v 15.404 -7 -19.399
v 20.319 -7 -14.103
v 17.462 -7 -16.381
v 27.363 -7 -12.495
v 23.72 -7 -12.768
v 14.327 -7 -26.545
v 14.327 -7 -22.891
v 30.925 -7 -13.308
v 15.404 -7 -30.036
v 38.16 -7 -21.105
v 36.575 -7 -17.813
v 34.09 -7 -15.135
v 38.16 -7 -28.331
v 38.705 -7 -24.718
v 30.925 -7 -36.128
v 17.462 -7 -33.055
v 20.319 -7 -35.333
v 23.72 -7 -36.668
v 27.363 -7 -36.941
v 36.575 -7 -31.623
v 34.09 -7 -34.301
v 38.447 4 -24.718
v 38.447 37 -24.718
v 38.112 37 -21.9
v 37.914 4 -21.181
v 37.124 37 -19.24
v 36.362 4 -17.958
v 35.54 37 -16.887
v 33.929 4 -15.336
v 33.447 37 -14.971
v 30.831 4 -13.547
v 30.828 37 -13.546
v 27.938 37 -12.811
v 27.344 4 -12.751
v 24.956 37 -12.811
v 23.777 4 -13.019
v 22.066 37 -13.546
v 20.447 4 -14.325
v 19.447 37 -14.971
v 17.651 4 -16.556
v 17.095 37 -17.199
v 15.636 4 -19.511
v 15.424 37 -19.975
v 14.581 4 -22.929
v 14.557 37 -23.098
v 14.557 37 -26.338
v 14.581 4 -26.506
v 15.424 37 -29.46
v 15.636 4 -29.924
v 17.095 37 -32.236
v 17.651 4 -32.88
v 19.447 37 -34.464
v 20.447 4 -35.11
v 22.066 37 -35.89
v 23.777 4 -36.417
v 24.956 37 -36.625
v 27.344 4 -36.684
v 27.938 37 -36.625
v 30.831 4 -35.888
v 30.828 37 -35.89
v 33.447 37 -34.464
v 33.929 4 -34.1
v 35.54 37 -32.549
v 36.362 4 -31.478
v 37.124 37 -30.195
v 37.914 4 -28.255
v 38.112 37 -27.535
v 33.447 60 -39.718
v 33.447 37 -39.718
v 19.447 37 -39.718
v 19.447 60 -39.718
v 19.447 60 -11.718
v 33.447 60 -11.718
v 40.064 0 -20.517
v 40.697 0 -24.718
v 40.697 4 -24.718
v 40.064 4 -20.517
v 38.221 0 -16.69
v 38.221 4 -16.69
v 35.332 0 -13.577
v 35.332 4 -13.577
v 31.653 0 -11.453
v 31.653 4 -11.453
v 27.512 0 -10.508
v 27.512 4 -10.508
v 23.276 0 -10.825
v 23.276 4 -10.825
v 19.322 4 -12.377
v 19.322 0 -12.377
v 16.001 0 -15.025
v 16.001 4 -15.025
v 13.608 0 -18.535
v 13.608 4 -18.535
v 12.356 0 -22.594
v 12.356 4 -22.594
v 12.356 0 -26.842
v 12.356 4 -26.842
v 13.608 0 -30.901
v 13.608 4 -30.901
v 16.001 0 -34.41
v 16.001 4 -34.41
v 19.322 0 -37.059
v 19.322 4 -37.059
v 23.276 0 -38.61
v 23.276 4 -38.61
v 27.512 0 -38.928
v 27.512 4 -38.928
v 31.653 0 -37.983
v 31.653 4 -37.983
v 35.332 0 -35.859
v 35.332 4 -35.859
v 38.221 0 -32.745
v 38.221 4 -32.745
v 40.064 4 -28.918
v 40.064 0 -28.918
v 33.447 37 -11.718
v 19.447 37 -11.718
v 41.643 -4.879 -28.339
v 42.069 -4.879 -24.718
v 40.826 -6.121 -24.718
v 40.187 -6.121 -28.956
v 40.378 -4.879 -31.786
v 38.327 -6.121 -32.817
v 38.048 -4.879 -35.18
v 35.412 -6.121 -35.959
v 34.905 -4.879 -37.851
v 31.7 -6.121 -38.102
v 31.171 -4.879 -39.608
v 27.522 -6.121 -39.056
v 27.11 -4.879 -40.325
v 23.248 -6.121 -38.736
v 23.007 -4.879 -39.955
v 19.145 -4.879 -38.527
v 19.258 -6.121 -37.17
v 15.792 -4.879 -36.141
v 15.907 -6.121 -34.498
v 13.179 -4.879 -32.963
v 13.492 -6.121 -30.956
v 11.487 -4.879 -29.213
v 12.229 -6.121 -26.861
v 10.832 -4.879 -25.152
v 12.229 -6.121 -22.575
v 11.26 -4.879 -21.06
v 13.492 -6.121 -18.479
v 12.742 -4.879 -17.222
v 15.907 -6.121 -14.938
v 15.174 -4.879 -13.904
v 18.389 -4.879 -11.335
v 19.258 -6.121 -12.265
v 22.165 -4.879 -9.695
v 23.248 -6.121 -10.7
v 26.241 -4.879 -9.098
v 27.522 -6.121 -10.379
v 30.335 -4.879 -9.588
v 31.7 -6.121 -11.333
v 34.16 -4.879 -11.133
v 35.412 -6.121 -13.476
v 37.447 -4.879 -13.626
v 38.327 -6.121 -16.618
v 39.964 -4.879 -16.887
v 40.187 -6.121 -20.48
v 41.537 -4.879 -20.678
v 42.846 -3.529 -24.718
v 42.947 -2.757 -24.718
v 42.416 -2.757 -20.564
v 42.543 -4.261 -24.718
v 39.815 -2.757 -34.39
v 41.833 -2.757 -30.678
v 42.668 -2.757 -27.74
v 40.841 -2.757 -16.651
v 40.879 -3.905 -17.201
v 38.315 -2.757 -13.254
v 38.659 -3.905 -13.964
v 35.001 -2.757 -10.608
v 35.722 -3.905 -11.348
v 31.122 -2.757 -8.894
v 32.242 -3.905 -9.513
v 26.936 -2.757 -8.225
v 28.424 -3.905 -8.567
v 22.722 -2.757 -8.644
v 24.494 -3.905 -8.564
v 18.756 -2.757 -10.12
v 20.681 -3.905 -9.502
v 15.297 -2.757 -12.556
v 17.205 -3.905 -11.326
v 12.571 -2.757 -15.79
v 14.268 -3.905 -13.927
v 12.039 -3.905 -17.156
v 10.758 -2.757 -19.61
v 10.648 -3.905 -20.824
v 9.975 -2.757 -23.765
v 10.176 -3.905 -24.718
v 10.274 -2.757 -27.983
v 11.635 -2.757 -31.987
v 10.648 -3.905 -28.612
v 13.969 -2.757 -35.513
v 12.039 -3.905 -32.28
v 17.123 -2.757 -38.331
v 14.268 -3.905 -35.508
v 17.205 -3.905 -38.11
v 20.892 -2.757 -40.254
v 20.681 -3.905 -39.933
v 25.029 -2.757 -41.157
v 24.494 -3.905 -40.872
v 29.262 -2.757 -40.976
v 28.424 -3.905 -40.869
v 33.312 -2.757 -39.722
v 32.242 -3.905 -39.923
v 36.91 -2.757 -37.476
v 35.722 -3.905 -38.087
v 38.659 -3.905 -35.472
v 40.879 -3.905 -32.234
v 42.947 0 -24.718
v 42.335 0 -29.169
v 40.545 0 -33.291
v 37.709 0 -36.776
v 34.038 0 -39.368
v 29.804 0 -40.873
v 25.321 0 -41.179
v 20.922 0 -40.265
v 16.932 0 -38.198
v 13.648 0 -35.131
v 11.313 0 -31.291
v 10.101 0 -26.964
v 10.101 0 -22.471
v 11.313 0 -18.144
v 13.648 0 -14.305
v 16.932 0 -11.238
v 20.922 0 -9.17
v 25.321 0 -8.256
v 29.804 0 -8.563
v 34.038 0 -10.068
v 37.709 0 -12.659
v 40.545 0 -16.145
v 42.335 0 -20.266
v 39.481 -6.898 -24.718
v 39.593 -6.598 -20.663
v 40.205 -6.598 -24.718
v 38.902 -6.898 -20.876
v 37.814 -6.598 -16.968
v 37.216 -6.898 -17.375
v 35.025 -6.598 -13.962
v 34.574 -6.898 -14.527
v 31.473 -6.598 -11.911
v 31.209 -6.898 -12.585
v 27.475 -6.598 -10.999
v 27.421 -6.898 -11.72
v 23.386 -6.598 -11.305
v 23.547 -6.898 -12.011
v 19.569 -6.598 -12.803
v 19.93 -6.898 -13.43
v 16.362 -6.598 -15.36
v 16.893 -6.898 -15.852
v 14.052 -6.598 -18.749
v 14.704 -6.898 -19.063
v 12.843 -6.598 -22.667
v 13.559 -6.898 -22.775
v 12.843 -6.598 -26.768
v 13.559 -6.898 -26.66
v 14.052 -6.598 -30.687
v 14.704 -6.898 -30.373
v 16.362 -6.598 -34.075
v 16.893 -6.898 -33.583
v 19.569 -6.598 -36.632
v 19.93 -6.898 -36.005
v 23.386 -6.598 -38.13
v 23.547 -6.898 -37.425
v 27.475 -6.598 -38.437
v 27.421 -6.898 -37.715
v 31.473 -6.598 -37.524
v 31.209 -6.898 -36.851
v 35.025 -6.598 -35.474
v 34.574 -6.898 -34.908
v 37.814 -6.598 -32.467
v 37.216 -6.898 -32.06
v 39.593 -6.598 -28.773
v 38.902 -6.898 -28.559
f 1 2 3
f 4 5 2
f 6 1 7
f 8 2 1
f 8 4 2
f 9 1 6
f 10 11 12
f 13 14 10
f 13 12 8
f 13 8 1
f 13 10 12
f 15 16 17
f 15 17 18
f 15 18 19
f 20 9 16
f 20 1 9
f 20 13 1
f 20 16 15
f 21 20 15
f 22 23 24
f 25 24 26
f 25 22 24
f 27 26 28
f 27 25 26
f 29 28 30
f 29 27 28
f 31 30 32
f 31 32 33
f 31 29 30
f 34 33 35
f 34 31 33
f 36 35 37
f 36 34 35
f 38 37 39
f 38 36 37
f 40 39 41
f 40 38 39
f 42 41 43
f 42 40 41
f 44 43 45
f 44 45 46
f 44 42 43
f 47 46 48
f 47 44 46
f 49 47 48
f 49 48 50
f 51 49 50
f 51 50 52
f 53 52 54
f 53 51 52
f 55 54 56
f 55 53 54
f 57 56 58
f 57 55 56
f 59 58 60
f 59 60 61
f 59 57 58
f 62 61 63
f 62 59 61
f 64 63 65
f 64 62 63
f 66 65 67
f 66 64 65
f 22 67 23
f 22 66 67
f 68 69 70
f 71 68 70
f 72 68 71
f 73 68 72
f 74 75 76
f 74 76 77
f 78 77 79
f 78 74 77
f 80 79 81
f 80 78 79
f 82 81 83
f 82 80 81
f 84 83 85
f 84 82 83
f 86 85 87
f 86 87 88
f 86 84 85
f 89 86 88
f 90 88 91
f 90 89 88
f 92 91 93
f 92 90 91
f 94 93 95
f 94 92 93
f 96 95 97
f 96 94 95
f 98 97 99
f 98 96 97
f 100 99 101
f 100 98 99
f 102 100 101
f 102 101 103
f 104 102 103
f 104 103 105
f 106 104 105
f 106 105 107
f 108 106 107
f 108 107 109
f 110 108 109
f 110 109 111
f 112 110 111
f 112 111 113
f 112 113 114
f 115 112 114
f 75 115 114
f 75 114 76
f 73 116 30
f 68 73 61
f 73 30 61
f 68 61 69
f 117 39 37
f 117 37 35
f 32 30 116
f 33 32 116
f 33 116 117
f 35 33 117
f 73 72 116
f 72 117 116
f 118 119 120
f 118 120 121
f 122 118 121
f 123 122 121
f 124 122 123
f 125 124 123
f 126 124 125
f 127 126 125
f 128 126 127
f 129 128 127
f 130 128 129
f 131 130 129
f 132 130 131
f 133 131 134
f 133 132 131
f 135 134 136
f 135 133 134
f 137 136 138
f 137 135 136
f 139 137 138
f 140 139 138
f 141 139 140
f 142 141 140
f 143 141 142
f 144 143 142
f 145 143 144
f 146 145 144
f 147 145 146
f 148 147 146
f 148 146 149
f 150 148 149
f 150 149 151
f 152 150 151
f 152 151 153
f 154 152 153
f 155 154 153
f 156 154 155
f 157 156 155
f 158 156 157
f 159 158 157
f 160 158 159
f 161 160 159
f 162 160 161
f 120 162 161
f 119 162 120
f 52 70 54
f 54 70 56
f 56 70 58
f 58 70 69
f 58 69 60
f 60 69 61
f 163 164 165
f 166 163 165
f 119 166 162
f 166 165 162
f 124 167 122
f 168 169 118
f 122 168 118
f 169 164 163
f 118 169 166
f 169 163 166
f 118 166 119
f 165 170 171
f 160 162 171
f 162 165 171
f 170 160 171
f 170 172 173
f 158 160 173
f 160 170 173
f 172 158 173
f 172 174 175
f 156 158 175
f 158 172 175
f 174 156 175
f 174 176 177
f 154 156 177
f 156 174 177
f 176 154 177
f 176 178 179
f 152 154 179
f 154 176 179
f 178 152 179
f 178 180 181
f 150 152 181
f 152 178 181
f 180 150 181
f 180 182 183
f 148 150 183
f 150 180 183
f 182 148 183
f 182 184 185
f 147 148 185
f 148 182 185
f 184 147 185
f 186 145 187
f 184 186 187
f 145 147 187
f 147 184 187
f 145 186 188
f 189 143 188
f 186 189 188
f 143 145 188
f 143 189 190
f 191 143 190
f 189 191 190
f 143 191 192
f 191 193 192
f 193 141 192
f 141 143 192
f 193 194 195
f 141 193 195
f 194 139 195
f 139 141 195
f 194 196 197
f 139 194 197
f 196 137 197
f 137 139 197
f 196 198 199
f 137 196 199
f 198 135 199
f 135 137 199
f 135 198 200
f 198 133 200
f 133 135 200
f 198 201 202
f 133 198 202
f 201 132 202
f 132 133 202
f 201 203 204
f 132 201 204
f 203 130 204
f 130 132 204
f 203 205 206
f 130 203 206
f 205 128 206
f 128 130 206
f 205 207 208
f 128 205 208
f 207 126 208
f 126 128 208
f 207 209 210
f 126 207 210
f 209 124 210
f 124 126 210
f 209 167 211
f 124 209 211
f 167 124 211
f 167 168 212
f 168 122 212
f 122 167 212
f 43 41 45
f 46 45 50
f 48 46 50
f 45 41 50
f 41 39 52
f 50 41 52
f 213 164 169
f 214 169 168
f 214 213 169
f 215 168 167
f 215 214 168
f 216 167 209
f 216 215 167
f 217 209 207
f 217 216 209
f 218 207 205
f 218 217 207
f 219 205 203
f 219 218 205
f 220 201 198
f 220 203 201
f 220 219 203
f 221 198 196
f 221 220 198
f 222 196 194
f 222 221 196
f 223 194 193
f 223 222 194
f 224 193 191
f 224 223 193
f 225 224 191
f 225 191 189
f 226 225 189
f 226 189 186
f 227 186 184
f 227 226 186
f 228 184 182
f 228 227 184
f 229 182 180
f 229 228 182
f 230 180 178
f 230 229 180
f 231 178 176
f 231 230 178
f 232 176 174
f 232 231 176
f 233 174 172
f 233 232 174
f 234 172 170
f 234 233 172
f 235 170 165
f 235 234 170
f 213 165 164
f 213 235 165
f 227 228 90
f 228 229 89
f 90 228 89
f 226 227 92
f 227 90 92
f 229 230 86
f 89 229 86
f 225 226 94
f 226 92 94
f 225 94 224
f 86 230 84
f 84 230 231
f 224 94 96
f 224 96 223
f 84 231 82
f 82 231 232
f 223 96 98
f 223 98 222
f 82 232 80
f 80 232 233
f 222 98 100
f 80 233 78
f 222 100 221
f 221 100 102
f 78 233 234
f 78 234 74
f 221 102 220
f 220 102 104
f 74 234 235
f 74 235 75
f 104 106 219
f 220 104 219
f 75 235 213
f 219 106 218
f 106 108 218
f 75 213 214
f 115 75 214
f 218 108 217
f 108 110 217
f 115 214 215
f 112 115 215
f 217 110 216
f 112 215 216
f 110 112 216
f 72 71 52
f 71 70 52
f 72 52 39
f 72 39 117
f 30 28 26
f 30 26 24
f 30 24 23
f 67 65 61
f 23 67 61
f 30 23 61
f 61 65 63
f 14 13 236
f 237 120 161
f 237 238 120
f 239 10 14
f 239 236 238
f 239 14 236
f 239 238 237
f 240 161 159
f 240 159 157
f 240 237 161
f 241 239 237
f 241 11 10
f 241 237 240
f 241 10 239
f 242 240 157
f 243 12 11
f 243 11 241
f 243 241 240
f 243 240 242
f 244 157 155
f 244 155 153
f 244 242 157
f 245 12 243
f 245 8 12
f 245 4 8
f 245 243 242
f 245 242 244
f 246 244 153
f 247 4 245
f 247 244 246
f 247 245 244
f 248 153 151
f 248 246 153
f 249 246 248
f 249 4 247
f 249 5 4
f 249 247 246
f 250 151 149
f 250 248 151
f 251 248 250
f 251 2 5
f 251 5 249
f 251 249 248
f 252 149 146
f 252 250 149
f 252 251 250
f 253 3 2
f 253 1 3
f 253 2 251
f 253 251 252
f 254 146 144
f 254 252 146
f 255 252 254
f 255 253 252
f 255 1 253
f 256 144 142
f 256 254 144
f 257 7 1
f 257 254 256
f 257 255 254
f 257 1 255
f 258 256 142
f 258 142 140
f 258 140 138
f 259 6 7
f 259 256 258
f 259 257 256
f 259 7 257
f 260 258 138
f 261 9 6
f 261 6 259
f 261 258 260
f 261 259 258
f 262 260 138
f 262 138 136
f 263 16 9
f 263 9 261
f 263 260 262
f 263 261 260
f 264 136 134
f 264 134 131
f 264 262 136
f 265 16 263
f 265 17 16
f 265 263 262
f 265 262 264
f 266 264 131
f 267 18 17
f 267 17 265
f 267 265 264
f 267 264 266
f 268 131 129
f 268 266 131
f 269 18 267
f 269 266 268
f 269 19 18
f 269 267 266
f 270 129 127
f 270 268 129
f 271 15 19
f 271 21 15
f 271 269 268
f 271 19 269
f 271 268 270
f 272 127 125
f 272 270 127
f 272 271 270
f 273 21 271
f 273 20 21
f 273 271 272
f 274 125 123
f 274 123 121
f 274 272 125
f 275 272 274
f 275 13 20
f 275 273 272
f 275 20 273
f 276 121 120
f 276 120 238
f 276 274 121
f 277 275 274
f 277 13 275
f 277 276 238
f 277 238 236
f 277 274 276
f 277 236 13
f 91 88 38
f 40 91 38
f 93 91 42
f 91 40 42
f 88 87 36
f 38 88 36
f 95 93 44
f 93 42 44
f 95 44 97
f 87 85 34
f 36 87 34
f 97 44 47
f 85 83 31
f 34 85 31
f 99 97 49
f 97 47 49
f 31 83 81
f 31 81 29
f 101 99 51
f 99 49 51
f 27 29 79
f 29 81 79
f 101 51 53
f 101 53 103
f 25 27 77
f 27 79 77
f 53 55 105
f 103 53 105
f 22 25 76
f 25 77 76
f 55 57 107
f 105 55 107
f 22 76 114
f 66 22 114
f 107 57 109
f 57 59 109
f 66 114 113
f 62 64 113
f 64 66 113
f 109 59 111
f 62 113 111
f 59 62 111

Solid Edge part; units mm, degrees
sketch "Sketch1" plane through (0, 0, 0) normal (0, -1, 0) x (1, 0, 0)
  circle A0 centre (26.4472, -24.7177) radius 16.5
extrude "Protrusion1" add sketch "Sketch1" along normal blind 7
sketch "Sketch2" plane through (0, 0, 0) normal (0, -1, 0) x (1, 0, 0)
  circle A0 centre (26.4472, -24.7177) radius 12
extrude "ExtrudedProtrusion_2" add sketch "Sketch2" against normal blind 37
sketch "Sketch3" plane through (0, 0, 0) normal (0, -1, 0) x (1, 0, 0)
  circle A0 centre (26.4472, -24.7177) radius 14.25
extrude "ExtrudedProtrusion_3" add sketch "Sketch3" against normal blind 4
chamfer "Chamfer_1" distance 3 angle 45 1 edges at (9.9472, -7, -24.7177)
fillet "Round_1" radius 3 2 edges at (26.4472, -4, -41.2177) (26.4472, -7, -38.2177)
sketch "Sketch4" plane through (26.4472, 37, -24.7177) normal (0, 1, 0) x (-1, 0, 0)
  line L0 (7, 13) -> (-7, 13)
  line L1 (-7, 13) -> (-7, -15)
  line L2 (-7, -15) -> (7, -15)
  line L3 (7, -15) -> (7, 13)
extrude "ExtrudedProtrusion_4" add sketch "Sketch4" along normal blind 23
